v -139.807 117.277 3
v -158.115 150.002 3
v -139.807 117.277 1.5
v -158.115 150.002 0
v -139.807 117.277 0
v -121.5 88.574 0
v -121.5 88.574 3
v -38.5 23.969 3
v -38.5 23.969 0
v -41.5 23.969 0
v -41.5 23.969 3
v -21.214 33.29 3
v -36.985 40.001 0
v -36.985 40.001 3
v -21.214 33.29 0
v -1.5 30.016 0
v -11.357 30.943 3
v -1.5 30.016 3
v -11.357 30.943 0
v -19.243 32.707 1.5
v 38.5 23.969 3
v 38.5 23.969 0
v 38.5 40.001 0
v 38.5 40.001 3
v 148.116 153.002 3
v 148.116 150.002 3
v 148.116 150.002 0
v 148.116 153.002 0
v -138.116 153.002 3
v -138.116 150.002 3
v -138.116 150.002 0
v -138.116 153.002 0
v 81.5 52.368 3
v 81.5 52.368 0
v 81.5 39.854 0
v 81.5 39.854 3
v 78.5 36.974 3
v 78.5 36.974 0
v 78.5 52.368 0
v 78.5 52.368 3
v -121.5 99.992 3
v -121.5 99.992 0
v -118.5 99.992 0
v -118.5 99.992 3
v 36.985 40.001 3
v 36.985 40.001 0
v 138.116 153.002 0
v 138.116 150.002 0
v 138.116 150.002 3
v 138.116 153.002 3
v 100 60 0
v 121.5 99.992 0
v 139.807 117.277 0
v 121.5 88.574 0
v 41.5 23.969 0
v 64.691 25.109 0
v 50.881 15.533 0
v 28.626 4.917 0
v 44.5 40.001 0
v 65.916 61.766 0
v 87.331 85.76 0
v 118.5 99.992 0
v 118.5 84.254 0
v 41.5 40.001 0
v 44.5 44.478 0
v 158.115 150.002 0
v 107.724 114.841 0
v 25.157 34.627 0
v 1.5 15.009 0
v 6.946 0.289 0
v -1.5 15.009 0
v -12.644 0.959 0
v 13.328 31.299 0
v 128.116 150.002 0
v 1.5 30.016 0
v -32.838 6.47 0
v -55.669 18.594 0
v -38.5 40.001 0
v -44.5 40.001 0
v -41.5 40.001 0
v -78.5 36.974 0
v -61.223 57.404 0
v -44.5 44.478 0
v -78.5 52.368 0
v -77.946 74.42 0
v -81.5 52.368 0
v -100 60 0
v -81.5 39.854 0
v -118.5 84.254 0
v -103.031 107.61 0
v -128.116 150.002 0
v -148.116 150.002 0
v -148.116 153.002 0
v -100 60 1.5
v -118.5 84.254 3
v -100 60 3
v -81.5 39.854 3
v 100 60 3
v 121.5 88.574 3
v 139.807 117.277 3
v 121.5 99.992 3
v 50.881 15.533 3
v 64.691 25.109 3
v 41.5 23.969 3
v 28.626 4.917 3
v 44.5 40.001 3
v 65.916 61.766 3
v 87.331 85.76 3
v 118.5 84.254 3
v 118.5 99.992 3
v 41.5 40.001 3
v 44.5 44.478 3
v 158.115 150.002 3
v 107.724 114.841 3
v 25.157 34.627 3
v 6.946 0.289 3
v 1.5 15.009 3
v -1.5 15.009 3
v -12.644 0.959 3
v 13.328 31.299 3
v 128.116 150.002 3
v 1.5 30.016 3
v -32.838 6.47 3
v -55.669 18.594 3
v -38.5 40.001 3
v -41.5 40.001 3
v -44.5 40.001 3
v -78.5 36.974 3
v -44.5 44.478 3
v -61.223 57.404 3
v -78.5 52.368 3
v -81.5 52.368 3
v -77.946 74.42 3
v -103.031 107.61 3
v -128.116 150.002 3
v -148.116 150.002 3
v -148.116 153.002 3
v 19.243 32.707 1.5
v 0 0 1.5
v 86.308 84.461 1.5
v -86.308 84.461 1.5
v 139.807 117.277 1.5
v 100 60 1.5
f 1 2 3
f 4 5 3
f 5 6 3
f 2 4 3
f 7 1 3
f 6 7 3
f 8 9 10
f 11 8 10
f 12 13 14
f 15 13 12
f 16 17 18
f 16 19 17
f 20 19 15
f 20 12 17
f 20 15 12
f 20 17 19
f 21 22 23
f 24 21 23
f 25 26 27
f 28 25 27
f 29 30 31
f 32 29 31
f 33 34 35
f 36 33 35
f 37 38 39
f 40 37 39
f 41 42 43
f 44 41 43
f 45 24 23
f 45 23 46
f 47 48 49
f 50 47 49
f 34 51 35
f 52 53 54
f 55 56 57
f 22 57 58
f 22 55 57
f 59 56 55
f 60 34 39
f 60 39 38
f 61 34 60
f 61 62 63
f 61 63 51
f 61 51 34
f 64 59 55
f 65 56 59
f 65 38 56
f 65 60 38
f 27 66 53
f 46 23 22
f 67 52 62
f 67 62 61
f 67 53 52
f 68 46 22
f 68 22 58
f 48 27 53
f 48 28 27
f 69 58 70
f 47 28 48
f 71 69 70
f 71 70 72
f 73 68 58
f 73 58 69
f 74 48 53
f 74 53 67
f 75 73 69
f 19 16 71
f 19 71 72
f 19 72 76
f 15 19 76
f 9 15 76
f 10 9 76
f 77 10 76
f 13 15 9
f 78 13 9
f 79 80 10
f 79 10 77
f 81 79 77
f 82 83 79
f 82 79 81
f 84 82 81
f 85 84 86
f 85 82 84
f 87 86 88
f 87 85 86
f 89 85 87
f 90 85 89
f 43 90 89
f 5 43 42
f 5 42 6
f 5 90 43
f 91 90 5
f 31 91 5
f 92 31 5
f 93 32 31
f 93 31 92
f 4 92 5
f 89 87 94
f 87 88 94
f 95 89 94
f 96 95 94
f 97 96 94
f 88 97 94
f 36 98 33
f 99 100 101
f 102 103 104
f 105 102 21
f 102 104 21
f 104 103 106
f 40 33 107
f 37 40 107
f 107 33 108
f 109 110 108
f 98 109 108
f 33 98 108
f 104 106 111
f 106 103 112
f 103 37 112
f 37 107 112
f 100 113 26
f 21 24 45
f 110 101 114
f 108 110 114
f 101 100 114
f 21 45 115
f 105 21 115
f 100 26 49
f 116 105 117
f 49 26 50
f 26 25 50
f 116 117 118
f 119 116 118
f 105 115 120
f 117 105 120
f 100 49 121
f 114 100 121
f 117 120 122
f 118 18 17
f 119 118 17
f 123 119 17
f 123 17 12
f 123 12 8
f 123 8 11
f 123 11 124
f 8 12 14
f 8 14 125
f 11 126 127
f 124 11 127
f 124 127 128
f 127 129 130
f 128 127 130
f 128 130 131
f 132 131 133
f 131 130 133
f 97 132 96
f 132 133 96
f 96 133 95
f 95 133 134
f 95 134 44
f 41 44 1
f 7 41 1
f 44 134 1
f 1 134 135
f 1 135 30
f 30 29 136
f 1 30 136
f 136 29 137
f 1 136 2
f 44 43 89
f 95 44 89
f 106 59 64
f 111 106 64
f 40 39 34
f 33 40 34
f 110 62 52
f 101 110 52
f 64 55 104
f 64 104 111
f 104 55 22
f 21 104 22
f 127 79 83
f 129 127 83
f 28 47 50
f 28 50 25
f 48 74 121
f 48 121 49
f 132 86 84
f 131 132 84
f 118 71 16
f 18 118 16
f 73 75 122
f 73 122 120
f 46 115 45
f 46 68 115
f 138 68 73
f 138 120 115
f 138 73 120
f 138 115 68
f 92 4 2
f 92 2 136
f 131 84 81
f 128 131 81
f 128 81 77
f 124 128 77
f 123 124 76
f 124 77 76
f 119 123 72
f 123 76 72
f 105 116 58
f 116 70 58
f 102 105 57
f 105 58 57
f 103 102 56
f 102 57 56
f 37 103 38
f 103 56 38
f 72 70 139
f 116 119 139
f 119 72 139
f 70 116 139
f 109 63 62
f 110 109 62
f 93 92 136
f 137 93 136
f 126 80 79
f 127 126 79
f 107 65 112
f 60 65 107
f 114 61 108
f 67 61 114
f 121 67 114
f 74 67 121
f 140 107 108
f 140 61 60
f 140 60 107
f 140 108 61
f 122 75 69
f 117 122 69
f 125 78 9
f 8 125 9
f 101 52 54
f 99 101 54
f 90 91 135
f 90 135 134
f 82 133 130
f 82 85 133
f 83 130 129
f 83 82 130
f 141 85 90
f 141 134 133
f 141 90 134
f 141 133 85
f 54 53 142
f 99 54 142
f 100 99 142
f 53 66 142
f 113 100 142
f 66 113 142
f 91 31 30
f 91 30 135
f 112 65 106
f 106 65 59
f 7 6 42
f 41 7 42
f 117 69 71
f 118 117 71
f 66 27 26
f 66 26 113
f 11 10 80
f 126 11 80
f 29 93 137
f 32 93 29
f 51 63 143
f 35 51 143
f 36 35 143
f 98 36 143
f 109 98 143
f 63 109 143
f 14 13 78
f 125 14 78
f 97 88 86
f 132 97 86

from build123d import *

# Parameters (mm, degrees)
EXTRUDE_1_DEPTH     = 3
EXTRUDE_2_DEPTH     = 3
SKETCH_3_W          = 3
SKETCH_3_H          = 16.032248228
CUT_EXTRUDE_1_DEPTH = 221.043181703


with BuildPart() as part:
    # 草图1 → 凸台-拉伸1 (new body)
    with BuildSketch(Plane.XY):
        with BuildLine():
            Line((-158.115, 150.002119351), (-128.116129222, 150.002119351))
            add(Edge.make_bspline(
                [(-128.116129222, 150.002119351), (0, -90.00211935), (128.116129222, 150.002119351)],
                knots=[0.138632221, 0.138632221, 0.138632221, 0.861367779, 0.861367779, 0.861367779], degree=2))
            Line((128.116129222, 150.002119351), (158.115, 150.002119351))
            add(Edge.make_bspline(
                [(-158.115, 150.002119351), (0, -150.002119351), (158.115, 150.002119351)],
                knots=[0.056807195, 0.056807195, 0.056807195, 0.943192805, 0.943192805, 0.943192805], degree=2))
        make_face()
    extrude(amount=EXTRUDE_1_DEPTH)

    # 草图2 → 凸台-拉伸2 (add)
    with BuildSketch(Plane(origin=(0, 150.002119351, 0), x_dir=(1, 0, 0), z_dir=(0, 1, 0))):
        Polygon((138.115564611, 0), (138.115564611, -0.999981179), (148.115564611, -2.000018821), (148.115564611, 0), align=None)
        Polygon((148.115564611, -2.000018821), (138.115564611, -0.999981179), (138.115564611, -3), (148.115564611, -3), align=None)
        Polygon((-148.115564611, 0), (-148.115564611, -2.000018821), (-138.115564611, -0.999981179), (-138.115564611, 0), align=None)
        Polygon((-138.115564611, -0.999981179), (-148.115564611, -2.000018821), (-148.115564611, -3), (-138.115564611, -3), align=None)
    extrude(amount=EXTRUDE_2_DEPTH)

    # 草图3 → 切除-拉伸1 (cut, through all)
    with BuildSketch(Plane(origin=(0, 0, 0), x_dir=(-1, 0, 0), z_dir=(0, 0, -1))):
        with BuildLine():
            Line((38.5, 47.194759053), (38.5, 40.836842401))
            add(Edge.make_bspline(
                [(41.5, 42.591500641), (40, 41.681271679), (38.5, 40.836842401)],
                knots=[0.382943991, 0.382943991, 0.382943991, 0.391405871, 0.391405871, 0.391405871], degree=2))
            Line((41.5, 42.591500641), (41.5, 47.194759053))
            Line((41.5, 47.194759053), (38.5, 47.194759053))
        make_face()
        with BuildLine():
            Line((41.5, 42.591500641), (41.5, 40.0008631))
            Line((41.5, 40.0008631), (44.5, 40.0008631))
            Line((44.5, 40.0008631), (44.5, 44.477758249))
            add(Edge.make_bspline(
                [(44.5, 44.477758249), (43, 43.501729603), (41.5, 42.591500641)],
                knots=[0.37448211, 0.37448211, 0.37448211, 0.382943991, 0.382943991, 0.382943991], degree=2))
        make_face()
        with BuildLine():
            Line((38.5, 40.836842401), (38.5, 40.0008631))
            Line((38.5, 40.0008631), (41.5, 40.0008631))
            Line((41.5, 40.0008631), (41.5, 42.591500641))
            add(Edge.make_bspline(
                [(41.5, 42.591500641), (40, 41.681271679), (38.5, 40.836842401)],
                knots=[0.382943991, 0.382943991, 0.382943991, 0.391405871, 0.391405871, 0.391405871], degree=2))
        make_face()
        with Locations((40, 31.984738986)):
            Rectangle(SKETCH_3_W, SKETCH_3_H)
        with BuildLine():
            add(Edge.make_bspline(
                [(38.5, 40.836842401), (37.742605127, 40.410464797), (36.985210253, 40.0008631)],
                knots=[0.391405871, 0.391405871, 0.391405871, 0.395678527, 0.395678527, 0.395678527], degree=2))
            Line((36.985210253, 40.0008631), (38.5, 40.0008631))
            Line((38.5, 40.0008631), (38.5, 40.836842401))
        make_face()
        with BuildLine():
            Line((-36.985210253, 40.0008631), (36.985210253, 40.0008631))
            add(Edge.make_bspline(
                [(38.5, 40.836842401), (37.742605127, 40.410464797), (36.985210253, 40.0008631)],
                knots=[0.391405871, 0.391405871, 0.391405871, 0.395678527, 0.395678527, 0.395678527], degree=2))
            Line((38.5, 40.836842401), (38.5, 47.194759053))
            Line((38.5, 47.194759053), (41.5, 47.194759053))
            Line((41.5, 47.194759053), (41.5, 42.591500641))
            add(Edge.make_bspline(
                [(44.5, 44.477758249), (43, 43.501729603), (41.5, 42.591500641)],
                knots=[0.37448211, 0.37448211, 0.37448211, 0.382943991, 0.382943991, 0.382943991], degree=2))
            Line((44.5, 44.477758249), (44.5, 80.0008631))
            Line((44.5, 80.0008631), (-44.5, 80.0008631))
            Line((-44.5, 80.0008631), (-44.5, 44.477758249))
            add(Edge.make_bspline(
                [(-40.274457726, 41.858798825), (-42.387228863, 43.103008147), (-44.5, 44.477758249)],
                knots=[0.613599212, 0.613599212, 0.613599212, 0.62551789, 0.62551789, 0.62551789], degree=2))
            Line((-40.274457726, 41.858798825), (-38.5, 41.858798825))
            Line((-38.5, 41.858798825), (-38.5, 40.836842401))
            add(Edge.make_bspline(
                [(-36.985210253, 40.0008631), (-37.742605127, 40.410464797), (-38.5, 40.836842401)],
                knots=[0.604321473, 0.604321473, 0.604321473, 0.608594129, 0.608594129, 0.608594129], degree=2))
        make_face()
        with BuildLine():
            Line((-38.5, 40.0008631), (-36.985210253, 40.0008631))
            add(Edge.make_bspline(
                [(-36.985210253, 40.0008631), (-37.742605127, 40.410464797), (-38.5, 40.836842401)],
                knots=[0.604321473, 0.604321473, 0.604321473, 0.608594129, 0.608594129, 0.608594129], degree=2))
            Line((-38.5, 40.836842401), (-38.5, 40.0008631))
        make_face()
        with BuildLine():
            add(Edge.make_bspline(
                [(-38.5, 40.836842401), (-39.387228863, 41.33631042), (-40.274457726, 41.858798825)],
                knots=[0.608594129, 0.608594129, 0.608594129, 0.613599212, 0.613599212, 0.613599212], degree=2))
            Line((-38.5, 40.836842401), (-38.5, 41.858798825))
            Line((-38.5, 41.858798825), (-40.274457726, 41.858798825))
        make_face()
        with BuildLine():
            Line((-41.5, 40.0008631), (-38.5, 40.0008631))
            Line((-38.5, 40.0008631), (-38.5, 40.836842401))
            add(Edge.make_bspline(
                [(-38.5, 40.836842401), (-39.387228863, 41.33631042), (-40.274457726, 41.858798825)],
                knots=[0.608594129, 0.608594129, 0.608594129, 0.613599212, 0.613599212, 0.613599212], degree=2))
            Line((-40.274457726, 41.858798825), (-41.5, 41.858798825))
            Line((-41.5, 41.858798825), (-41.5, 40.0008631))
        make_face()
        with BuildLine():
            Line((-44.5, 40.0008631), (-41.5, 40.0008631))
            Line((-41.5, 40.0008631), (-41.5, 41.858798825))
            Line((-41.5, 41.858798825), (-40.274457726, 41.858798825))
            add(Edge.make_bspline(
                [(-40.274457726, 41.858798825), (-42.387228863, 43.103008147), (-44.5, 44.477758249)],
                knots=[0.613599212, 0.613599212, 0.613599212, 0.62551789, 0.62551789, 0.62551789], degree=2))
            Line((-44.5, 44.477758249), (-44.5, 40.0008631))
        make_face()
        with Locations((-40, 31.984738986)):
            Rectangle(SKETCH_3_W, SKETCH_3_H)
        with BuildLine():
            Line((-1.5, 15.008656511), (1.5, 15.008656511))
            Line((1.5, 15.008656511), (1.5, 30.016449922))
            add(Edge.make_bspline(
                [(-1.5, 30.016449922), (0, 29.98355008), (1.5, 30.016449922)],
                knots=[0, 0, 0, 1, 1, 1], degree=2))
            Line((-1.5, 30.016449922), (-1.5, 15.008656511))
        make_face()
        with BuildLine():
            Line((-118.5, 84.2535), (-118.5, 99.99195986))
            Line((-118.5, 99.99195986), (-121.5, 99.99195986))
            Line((-121.5, 99.99195986), (-121.5, 88.5735))
            add(Edge.make_bspline(
                [(-121.5, 88.5735), (-120, 86.3865), (-118.5, 84.2535)],
                knots=[0.15943822, 0.15943822, 0.15943822, 0.167847153, 0.167847153, 0.167847153], degree=2))
        make_face()
        with BuildLine():
            Line((-81.5, 52.368455115), (-81.5, 39.8535))
            add(Edge.make_bspline(
                [(-81.5, 39.8535), (-80, 38.3865), (-78.5, 36.9735)],
                knots=[0.271557325, 0.271557325, 0.271557325, 0.279966258, 0.279966258, 0.279966258], degree=2))
            Line((-78.5, 36.9735), (-78.5, 52.368455115))
            Line((-78.5, 52.368455115), (-81.5, 52.368455115))
        make_face()
        with BuildLine():
            Line((78.5, 52.368455115), (78.5, 36.9735))
            add(Edge.make_bspline(
                [(78.5, 36.9735), (80, 38.3865), (81.5, 39.8535)],
                knots=[0.720033742, 0.720033742, 0.720033742, 0.728442675, 0.728442675, 0.728442675], degree=2))
            Line((81.5, 39.8535), (81.5, 52.368455115))
            Line((81.5, 52.368455115), (78.5, 52.368455115))
        make_face()
        with BuildLine():
            Line((118.5, 99.99195986), (118.5, 84.2535))
            add(Edge.make_bspline(
                [(118.5, 84.2535), (120, 86.3865), (121.5, 88.5735)],
                knots=[0.832152847, 0.832152847, 0.832152847, 0.84056178, 0.84056178, 0.84056178], degree=2))
            Line((121.5, 88.5735), (121.5, 99.99195986))
            Line((121.5, 99.99195986), (118.5, 99.99195986))
        make_face()
    extrude(amount=-CUT_EXTRUDE_1_DEPTH, mode=Mode.SUBTRACT)


solid = part.part
